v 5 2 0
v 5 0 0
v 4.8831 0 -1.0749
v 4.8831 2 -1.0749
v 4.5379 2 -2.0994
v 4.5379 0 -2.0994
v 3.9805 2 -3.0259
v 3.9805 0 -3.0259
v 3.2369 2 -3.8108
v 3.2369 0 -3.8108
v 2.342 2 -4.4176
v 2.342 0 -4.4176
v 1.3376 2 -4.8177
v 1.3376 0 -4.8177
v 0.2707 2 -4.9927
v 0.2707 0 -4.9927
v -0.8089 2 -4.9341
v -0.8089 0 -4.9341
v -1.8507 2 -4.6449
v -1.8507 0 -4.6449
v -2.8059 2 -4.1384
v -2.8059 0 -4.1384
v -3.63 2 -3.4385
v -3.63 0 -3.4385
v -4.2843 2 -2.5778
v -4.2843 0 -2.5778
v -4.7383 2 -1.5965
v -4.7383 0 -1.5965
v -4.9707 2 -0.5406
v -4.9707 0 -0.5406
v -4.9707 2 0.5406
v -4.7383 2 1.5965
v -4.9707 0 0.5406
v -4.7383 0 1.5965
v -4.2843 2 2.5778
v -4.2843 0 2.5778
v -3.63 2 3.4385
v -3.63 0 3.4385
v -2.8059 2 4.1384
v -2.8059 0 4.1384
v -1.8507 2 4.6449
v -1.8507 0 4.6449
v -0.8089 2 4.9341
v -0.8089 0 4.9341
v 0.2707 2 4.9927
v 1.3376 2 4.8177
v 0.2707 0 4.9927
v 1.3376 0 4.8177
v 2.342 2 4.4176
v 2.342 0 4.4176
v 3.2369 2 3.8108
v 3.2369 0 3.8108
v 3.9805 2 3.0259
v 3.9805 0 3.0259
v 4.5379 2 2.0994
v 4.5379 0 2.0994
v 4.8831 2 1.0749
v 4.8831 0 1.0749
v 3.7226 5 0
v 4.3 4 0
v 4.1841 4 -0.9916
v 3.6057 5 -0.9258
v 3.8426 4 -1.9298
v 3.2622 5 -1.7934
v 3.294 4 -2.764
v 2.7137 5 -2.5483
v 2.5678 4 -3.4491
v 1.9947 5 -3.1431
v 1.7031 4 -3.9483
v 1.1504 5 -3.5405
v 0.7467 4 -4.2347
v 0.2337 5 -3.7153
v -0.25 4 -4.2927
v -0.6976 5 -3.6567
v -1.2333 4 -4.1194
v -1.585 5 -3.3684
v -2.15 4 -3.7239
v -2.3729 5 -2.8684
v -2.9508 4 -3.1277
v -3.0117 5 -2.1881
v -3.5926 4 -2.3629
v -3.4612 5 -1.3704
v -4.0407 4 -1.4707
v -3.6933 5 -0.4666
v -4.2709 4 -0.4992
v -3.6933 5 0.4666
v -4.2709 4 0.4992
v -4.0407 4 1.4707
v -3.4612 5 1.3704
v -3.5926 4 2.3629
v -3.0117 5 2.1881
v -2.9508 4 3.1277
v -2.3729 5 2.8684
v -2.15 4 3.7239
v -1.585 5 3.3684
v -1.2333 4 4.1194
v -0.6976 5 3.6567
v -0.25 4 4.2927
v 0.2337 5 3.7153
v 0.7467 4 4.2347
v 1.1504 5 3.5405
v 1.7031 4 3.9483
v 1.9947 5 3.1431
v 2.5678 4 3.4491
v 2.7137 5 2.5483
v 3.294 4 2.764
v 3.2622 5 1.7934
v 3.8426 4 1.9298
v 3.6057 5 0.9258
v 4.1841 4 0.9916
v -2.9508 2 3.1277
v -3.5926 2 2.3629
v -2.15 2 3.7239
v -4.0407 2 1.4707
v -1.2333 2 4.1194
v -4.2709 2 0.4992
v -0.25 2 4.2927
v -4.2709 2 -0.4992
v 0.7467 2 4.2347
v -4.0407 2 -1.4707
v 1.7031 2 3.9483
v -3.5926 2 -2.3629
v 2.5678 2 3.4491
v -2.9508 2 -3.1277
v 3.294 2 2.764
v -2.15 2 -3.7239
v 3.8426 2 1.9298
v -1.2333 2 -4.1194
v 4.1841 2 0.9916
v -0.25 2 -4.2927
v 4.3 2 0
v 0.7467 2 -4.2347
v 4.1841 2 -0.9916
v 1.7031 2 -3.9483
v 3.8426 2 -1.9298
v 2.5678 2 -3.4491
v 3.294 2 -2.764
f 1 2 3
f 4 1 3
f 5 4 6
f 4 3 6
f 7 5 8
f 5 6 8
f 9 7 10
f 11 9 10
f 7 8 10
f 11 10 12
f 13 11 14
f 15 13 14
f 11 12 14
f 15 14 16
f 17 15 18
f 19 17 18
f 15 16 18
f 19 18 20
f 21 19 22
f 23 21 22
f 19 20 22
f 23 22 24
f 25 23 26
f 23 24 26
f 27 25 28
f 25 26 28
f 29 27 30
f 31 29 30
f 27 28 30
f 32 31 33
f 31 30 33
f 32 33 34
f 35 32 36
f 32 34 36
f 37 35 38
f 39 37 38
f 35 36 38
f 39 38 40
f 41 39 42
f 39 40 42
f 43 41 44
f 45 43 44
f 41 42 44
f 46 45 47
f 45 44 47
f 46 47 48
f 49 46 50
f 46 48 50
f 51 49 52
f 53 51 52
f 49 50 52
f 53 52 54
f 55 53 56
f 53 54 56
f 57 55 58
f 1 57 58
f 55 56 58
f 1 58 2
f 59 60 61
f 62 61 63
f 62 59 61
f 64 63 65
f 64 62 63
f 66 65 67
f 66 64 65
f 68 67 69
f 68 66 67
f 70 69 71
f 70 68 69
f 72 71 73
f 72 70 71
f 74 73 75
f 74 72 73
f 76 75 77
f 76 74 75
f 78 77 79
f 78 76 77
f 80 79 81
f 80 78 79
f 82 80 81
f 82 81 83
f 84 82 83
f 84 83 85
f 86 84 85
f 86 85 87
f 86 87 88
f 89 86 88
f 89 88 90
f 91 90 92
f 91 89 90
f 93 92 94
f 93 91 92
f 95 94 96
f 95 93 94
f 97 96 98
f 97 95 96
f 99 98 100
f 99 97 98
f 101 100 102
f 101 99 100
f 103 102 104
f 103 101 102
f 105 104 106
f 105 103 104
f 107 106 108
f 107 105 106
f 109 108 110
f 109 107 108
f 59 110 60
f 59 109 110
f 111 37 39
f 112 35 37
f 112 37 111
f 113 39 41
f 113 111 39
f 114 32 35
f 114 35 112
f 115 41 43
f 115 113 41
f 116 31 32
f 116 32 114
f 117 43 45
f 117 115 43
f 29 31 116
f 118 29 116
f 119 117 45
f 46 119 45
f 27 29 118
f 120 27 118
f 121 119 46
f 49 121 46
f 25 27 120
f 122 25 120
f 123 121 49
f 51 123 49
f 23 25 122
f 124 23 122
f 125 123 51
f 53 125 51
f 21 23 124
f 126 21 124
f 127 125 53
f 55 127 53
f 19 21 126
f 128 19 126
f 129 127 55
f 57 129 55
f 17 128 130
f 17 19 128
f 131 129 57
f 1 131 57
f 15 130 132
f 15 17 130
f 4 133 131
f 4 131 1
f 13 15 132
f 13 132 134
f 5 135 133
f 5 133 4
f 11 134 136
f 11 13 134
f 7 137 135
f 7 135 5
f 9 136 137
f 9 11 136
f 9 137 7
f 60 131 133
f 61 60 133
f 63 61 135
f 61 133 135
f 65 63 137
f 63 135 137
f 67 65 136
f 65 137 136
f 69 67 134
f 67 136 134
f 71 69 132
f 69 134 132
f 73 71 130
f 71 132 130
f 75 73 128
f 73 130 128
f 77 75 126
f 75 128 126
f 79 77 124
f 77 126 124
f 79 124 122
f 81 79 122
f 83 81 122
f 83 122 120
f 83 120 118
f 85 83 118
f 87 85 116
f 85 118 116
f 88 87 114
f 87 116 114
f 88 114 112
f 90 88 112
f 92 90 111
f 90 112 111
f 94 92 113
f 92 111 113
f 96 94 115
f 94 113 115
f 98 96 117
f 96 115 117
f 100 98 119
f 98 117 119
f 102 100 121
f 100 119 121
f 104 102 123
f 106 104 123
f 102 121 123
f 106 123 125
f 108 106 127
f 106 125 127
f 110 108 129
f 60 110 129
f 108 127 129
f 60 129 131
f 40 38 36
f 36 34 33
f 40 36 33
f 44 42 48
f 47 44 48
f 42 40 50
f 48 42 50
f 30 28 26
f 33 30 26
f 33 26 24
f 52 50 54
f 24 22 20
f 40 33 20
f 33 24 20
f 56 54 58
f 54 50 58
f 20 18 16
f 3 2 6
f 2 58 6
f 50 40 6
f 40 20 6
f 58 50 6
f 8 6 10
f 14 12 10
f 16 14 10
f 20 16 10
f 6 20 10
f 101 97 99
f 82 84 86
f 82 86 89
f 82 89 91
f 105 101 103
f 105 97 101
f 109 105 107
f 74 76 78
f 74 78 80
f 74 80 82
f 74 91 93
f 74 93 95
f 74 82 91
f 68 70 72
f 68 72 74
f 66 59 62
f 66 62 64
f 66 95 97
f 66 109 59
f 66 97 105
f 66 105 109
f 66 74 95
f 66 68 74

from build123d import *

# Parameters (mm, degrees)
SKETCH1_R           = 5
BOSS_EXTRUDE1_DEPTH = 2
SKETCH2_R           = 4.3
BOSS_EXTRUDE2_DEPTH = 3
CHAMFER1_SIZE       = 1
CHAMFER1_SIZE2      = 0.577350269


with BuildPart() as part:
    # Sketch1 → Boss-Extrude1 (new body)
    with BuildSketch(Plane(origin=(0, 0, 0), x_dir=(1, 0, 0), z_dir=(0, 1, 0))):
        Circle(SKETCH1_R)
    extrude(amount=BOSS_EXTRUDE1_DEPTH)

    # Sketch2 → Boss-Extrude2 (add)
    with BuildSketch(Plane(origin=(0, 2, 0), x_dir=(1, 0, 0), z_dir=(0, 1, 0))):
        Circle(SKETCH2_R)
    extrude(amount=BOSS_EXTRUDE2_DEPTH)

    # Chamfer1
    chamfer1_edges = [part.edges().sort_by_distance(p)[0] for p in [
        (-4.3, 5, 0),
    ]]
    chamfer1_side = [part.faces().sort_by_distance(p)[0] for p in [
        (-4.3, 3.5, 0),
    ]]
    chamfer(chamfer1_edges, length=CHAMFER1_SIZE, length2=CHAMFER1_SIZE2, reference=chamfer1_side[0])


solid = part.part
